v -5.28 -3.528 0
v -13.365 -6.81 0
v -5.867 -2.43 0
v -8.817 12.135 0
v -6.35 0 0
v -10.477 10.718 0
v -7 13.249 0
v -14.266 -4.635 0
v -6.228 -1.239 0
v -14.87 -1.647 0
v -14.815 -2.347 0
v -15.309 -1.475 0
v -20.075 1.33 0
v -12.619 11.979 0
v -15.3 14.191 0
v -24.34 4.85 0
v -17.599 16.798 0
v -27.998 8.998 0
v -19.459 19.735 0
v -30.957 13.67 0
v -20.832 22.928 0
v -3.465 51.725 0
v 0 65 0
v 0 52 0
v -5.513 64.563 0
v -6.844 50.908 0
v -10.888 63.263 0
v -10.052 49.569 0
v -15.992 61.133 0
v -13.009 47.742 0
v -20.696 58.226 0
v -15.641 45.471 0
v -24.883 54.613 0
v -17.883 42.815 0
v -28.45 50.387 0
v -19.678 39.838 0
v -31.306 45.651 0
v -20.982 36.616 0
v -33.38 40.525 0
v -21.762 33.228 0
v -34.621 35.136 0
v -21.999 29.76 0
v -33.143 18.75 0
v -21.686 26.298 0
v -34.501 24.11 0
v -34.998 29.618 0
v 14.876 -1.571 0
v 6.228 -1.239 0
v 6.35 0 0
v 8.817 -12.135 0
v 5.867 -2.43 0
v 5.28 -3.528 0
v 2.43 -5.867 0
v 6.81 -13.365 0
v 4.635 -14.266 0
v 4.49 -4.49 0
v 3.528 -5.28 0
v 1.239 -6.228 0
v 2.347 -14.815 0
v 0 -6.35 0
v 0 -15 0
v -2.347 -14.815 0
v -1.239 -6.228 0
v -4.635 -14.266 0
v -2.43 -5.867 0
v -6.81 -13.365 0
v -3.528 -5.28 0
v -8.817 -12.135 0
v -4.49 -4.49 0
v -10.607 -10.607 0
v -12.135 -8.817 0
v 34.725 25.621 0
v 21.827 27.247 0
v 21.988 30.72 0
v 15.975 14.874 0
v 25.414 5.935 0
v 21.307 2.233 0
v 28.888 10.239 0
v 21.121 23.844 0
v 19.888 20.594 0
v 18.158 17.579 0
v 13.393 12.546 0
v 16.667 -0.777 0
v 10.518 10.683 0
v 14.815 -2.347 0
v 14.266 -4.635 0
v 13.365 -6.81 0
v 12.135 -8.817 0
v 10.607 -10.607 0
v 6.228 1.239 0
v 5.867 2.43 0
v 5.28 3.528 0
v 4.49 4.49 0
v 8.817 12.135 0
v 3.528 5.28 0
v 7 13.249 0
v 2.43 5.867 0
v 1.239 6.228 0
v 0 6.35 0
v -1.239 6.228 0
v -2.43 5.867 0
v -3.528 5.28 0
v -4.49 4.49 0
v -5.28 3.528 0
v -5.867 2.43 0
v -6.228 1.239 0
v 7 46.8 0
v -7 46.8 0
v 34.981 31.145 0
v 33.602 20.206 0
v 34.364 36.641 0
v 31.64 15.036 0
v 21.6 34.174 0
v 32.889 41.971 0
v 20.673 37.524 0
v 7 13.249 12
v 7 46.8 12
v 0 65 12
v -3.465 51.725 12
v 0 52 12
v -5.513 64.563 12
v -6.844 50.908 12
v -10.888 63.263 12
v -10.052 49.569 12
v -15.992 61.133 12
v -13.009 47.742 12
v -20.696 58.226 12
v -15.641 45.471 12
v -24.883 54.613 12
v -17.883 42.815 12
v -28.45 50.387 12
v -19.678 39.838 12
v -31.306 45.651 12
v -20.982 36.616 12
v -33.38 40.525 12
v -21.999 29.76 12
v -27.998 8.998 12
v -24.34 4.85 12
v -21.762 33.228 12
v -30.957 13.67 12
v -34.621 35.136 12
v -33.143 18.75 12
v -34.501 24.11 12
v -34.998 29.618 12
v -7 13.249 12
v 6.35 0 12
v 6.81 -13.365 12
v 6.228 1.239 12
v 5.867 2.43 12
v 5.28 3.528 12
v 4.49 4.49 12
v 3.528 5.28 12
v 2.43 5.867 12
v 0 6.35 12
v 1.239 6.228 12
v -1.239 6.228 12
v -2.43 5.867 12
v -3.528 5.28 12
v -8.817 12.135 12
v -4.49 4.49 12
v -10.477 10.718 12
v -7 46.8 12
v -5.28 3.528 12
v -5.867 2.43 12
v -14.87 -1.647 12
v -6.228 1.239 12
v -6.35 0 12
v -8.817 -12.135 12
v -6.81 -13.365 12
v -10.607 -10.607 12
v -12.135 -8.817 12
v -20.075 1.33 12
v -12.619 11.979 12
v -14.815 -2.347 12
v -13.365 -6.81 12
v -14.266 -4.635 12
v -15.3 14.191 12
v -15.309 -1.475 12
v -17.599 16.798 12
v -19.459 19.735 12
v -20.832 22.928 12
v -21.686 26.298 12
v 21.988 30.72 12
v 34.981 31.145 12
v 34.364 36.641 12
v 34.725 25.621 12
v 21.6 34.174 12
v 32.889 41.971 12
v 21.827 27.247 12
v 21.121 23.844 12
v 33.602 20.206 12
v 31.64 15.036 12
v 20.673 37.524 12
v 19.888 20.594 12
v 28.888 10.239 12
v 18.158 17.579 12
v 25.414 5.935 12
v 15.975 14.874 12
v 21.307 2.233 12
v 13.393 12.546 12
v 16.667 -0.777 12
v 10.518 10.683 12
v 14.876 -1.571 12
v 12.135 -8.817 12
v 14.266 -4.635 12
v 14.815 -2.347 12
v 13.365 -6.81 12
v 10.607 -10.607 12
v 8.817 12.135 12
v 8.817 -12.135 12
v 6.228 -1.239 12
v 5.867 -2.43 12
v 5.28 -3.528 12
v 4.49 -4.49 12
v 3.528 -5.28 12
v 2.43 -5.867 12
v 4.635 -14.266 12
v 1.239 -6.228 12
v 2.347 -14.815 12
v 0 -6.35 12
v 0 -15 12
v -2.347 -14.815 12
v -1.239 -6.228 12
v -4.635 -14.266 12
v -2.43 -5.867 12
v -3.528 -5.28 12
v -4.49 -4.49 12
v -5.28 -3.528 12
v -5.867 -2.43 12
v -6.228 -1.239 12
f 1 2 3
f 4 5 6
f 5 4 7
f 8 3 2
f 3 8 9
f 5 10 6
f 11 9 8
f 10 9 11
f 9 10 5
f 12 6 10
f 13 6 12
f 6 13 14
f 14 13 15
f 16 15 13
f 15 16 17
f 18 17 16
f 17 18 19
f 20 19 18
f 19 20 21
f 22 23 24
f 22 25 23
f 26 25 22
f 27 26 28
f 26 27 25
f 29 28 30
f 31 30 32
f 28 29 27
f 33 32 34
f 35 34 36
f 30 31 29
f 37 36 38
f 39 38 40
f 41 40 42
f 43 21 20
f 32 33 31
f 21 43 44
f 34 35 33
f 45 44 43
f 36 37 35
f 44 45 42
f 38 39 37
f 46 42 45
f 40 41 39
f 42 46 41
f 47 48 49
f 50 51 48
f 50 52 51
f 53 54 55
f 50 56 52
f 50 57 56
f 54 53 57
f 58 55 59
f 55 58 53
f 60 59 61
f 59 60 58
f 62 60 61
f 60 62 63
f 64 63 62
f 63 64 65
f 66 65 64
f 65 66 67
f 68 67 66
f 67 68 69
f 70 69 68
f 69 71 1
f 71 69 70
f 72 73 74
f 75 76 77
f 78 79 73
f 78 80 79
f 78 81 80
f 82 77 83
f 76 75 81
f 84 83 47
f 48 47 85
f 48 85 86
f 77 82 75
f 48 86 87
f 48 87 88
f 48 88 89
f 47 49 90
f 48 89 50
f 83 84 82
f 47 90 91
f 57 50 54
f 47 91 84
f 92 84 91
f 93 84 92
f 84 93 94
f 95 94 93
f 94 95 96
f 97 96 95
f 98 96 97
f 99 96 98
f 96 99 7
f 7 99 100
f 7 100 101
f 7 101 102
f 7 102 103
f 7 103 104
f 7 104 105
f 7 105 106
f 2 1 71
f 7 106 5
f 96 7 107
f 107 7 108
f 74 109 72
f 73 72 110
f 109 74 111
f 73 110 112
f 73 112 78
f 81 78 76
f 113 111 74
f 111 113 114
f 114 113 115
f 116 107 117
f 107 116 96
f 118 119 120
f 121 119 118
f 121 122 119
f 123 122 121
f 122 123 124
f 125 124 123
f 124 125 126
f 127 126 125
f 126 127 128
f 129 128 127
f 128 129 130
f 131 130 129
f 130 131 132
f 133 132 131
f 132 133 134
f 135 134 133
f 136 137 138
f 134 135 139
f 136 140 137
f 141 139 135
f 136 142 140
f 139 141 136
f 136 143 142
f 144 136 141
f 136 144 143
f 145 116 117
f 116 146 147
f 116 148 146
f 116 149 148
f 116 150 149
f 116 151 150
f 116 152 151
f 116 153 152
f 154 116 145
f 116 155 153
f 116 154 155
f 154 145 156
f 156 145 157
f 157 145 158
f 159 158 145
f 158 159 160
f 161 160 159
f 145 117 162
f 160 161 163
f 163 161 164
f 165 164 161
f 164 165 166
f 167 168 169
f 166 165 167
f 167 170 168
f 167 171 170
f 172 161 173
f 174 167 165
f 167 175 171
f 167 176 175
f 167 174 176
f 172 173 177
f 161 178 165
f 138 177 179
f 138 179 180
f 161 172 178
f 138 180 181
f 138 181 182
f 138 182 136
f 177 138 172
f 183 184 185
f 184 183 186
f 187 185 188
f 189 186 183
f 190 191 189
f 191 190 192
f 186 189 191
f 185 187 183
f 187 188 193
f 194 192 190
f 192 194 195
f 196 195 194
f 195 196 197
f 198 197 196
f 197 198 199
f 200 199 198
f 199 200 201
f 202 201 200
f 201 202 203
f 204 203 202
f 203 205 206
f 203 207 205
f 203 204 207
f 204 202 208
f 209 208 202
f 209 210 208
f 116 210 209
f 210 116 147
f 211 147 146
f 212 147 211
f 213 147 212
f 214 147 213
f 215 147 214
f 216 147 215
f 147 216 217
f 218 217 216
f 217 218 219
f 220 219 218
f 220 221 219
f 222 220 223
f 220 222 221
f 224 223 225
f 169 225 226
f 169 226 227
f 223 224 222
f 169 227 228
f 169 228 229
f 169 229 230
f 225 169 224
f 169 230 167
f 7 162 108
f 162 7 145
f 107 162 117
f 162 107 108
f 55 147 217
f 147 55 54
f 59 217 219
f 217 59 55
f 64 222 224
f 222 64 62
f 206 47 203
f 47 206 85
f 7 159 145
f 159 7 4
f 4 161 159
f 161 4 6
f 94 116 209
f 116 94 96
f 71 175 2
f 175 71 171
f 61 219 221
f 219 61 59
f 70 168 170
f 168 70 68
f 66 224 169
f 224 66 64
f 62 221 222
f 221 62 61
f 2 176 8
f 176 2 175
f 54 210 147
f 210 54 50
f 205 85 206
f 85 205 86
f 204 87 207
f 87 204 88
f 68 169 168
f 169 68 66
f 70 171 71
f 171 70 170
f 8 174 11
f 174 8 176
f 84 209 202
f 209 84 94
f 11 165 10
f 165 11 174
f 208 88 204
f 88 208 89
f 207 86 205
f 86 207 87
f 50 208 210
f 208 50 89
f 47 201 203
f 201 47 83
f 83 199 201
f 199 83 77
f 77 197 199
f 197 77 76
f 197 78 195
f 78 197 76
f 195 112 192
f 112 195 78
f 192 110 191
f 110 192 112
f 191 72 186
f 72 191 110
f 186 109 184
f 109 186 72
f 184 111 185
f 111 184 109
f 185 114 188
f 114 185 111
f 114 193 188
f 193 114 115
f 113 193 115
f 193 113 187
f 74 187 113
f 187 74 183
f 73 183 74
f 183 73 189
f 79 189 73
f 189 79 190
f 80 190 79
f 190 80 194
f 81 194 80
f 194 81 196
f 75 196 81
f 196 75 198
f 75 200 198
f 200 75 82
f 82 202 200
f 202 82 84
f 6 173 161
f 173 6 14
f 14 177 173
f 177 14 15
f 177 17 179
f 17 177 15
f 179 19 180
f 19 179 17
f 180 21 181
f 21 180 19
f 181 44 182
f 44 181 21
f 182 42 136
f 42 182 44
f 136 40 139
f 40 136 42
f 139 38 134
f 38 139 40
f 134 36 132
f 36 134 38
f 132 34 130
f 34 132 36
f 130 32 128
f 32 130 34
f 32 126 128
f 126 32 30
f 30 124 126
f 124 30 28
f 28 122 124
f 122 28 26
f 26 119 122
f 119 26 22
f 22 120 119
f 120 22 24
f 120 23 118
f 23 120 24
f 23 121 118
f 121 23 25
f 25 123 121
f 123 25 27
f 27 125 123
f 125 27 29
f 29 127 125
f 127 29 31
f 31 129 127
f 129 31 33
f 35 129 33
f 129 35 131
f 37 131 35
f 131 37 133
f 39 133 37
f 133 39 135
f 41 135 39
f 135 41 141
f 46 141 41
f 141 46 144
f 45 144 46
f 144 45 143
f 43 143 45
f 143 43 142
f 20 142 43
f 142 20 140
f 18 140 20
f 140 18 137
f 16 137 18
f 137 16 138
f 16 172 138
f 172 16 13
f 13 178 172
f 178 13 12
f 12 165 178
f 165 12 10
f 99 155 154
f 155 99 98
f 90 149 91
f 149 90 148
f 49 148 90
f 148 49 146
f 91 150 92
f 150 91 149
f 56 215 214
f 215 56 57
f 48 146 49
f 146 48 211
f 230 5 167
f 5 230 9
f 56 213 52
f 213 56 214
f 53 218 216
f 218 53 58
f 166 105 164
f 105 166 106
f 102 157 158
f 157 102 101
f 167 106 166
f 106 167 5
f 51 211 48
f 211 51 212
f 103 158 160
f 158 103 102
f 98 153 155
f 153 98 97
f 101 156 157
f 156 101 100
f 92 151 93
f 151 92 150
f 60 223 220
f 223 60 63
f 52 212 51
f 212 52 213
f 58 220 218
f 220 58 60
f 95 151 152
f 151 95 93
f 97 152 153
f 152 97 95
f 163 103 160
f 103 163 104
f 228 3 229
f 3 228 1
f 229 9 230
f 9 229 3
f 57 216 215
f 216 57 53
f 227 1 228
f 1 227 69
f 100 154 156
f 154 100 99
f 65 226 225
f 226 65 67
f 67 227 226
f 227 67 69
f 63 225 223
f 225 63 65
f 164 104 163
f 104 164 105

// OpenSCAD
$fn = 32;

// ----------------------------------------------------------------------
// Hook: 60 mm shank into a 22 mm curl, 12 mm thick
// ----------------------------------------------------------------------

// --- parameters (mm) ---
shank_len = 60;           // shank length from the boss centre
shank_w = 14;             // shank width
boss_d = 30;              // boss diameter
bore_d = 12.7;            // boss bore
curl_in = 22;             // curl inner radius
curl_out = 35;            // curl outer radius
curl_sweep = 290;         // curl sweep angle
hook_t = 12;              // hook thickness

shank_profile = [[-7, 46.8], [7, 46.8], [7, 13], [-7, 13]];
boss_profile = [[15, 0], [14.815, 2.347], [14.266, 4.635], [13.365, 6.81], [12.135, 8.817], [10.607, 10.607], [8.817, 12.135], [6.81, 13.365], [4.635, 14.266], [2.347, 14.815], [0, 15], [-2.347, 14.815], [-4.635, 14.266], [-6.81, 13.365], [-8.817, 12.135], [-10.607, 10.607], [-12.135, 8.817], [-13.365, 6.81], [-14.266, 4.635], [-14.815, 2.347], [-15, 0], [-14.815, -2.347], [-14.266, -4.635], [-13.365, -6.81], [-12.135, -8.817], [-10.607, -10.607], [-8.817, -12.135], [-6.81, -13.365], [-4.635, -14.266], [-2.347, -14.815], [0, -15], [2.347, -14.815], [4.635, -14.266], [6.81, -13.365], [8.817, -12.135], [10.607, -10.607], [12.135, -8.817], [13.365, -6.81], [14.266, -4.635], [14.815, -2.347]];
curl_profile = [[0, 65], [-5.513, 64.563], [-10.888, 63.263], [-15.992, 61.133], [-20.696, 58.226], [-24.883, 54.613], [-28.45, 50.387], [-31.306, 45.651], [-33.38, 40.525], [-34.621, 35.136], [-34.998, 29.618], [-34.501, 24.11], [-33.143, 18.75], [-30.957, 13.67], [-27.998, 8.998], [-24.34, 4.85], [-20.075, 1.33], [-15.309, -1.475], [-10.16, -3.493], [-4.758, -4.675], [0.764, -4.992], [6.266, -4.435], [11.611, -3.018], [16.667, -0.777], [21.307, 2.233], [25.414, 5.935], [28.888, 10.239], [31.64, 15.036], [33.602, 20.206], [34.725, 25.621], [34.981, 31.145], [34.364, 36.641], [32.889, 41.971], [20.673, 37.524], [21.6, 34.174], [21.988, 30.72], [21.827, 27.247], [21.121, 23.844], [19.888, 20.594], [18.158, 17.579], [15.975, 14.874], [13.393, 12.546], [10.476, 10.655], [7.298, 9.246], [3.938, 8.355], [0.48, 8.005], [-2.99, 8.204], [-6.386, 8.947], [-9.623, 10.216], [-12.619, 11.979], [-15.3, 14.191], [-17.599, 16.798], [-19.459, 19.735], [-20.832, 22.928], [-21.686, 26.298], [-21.999, 29.76], [-21.762, 33.228], [-20.982, 36.616], [-19.678, 39.838], [-17.883, 42.815], [-15.641, 45.471], [-13.009, 47.742], [-10.052, 49.569], [-6.844, 50.908], [-3.465, 51.725], [0, 52]];

difference() {
  union() {
    /* three overlapping outlines: shank, boss and the smooth curl */
    linear_extrude(height = hook_t) polygon(shank_profile);
    linear_extrude(height = hook_t) polygon(boss_profile);
    linear_extrude(height = hook_t) polygon(curl_profile);
  }
  translate([0, 0, -2.5]) cylinder(h = hook_t + 5, d = bore_d);
}
